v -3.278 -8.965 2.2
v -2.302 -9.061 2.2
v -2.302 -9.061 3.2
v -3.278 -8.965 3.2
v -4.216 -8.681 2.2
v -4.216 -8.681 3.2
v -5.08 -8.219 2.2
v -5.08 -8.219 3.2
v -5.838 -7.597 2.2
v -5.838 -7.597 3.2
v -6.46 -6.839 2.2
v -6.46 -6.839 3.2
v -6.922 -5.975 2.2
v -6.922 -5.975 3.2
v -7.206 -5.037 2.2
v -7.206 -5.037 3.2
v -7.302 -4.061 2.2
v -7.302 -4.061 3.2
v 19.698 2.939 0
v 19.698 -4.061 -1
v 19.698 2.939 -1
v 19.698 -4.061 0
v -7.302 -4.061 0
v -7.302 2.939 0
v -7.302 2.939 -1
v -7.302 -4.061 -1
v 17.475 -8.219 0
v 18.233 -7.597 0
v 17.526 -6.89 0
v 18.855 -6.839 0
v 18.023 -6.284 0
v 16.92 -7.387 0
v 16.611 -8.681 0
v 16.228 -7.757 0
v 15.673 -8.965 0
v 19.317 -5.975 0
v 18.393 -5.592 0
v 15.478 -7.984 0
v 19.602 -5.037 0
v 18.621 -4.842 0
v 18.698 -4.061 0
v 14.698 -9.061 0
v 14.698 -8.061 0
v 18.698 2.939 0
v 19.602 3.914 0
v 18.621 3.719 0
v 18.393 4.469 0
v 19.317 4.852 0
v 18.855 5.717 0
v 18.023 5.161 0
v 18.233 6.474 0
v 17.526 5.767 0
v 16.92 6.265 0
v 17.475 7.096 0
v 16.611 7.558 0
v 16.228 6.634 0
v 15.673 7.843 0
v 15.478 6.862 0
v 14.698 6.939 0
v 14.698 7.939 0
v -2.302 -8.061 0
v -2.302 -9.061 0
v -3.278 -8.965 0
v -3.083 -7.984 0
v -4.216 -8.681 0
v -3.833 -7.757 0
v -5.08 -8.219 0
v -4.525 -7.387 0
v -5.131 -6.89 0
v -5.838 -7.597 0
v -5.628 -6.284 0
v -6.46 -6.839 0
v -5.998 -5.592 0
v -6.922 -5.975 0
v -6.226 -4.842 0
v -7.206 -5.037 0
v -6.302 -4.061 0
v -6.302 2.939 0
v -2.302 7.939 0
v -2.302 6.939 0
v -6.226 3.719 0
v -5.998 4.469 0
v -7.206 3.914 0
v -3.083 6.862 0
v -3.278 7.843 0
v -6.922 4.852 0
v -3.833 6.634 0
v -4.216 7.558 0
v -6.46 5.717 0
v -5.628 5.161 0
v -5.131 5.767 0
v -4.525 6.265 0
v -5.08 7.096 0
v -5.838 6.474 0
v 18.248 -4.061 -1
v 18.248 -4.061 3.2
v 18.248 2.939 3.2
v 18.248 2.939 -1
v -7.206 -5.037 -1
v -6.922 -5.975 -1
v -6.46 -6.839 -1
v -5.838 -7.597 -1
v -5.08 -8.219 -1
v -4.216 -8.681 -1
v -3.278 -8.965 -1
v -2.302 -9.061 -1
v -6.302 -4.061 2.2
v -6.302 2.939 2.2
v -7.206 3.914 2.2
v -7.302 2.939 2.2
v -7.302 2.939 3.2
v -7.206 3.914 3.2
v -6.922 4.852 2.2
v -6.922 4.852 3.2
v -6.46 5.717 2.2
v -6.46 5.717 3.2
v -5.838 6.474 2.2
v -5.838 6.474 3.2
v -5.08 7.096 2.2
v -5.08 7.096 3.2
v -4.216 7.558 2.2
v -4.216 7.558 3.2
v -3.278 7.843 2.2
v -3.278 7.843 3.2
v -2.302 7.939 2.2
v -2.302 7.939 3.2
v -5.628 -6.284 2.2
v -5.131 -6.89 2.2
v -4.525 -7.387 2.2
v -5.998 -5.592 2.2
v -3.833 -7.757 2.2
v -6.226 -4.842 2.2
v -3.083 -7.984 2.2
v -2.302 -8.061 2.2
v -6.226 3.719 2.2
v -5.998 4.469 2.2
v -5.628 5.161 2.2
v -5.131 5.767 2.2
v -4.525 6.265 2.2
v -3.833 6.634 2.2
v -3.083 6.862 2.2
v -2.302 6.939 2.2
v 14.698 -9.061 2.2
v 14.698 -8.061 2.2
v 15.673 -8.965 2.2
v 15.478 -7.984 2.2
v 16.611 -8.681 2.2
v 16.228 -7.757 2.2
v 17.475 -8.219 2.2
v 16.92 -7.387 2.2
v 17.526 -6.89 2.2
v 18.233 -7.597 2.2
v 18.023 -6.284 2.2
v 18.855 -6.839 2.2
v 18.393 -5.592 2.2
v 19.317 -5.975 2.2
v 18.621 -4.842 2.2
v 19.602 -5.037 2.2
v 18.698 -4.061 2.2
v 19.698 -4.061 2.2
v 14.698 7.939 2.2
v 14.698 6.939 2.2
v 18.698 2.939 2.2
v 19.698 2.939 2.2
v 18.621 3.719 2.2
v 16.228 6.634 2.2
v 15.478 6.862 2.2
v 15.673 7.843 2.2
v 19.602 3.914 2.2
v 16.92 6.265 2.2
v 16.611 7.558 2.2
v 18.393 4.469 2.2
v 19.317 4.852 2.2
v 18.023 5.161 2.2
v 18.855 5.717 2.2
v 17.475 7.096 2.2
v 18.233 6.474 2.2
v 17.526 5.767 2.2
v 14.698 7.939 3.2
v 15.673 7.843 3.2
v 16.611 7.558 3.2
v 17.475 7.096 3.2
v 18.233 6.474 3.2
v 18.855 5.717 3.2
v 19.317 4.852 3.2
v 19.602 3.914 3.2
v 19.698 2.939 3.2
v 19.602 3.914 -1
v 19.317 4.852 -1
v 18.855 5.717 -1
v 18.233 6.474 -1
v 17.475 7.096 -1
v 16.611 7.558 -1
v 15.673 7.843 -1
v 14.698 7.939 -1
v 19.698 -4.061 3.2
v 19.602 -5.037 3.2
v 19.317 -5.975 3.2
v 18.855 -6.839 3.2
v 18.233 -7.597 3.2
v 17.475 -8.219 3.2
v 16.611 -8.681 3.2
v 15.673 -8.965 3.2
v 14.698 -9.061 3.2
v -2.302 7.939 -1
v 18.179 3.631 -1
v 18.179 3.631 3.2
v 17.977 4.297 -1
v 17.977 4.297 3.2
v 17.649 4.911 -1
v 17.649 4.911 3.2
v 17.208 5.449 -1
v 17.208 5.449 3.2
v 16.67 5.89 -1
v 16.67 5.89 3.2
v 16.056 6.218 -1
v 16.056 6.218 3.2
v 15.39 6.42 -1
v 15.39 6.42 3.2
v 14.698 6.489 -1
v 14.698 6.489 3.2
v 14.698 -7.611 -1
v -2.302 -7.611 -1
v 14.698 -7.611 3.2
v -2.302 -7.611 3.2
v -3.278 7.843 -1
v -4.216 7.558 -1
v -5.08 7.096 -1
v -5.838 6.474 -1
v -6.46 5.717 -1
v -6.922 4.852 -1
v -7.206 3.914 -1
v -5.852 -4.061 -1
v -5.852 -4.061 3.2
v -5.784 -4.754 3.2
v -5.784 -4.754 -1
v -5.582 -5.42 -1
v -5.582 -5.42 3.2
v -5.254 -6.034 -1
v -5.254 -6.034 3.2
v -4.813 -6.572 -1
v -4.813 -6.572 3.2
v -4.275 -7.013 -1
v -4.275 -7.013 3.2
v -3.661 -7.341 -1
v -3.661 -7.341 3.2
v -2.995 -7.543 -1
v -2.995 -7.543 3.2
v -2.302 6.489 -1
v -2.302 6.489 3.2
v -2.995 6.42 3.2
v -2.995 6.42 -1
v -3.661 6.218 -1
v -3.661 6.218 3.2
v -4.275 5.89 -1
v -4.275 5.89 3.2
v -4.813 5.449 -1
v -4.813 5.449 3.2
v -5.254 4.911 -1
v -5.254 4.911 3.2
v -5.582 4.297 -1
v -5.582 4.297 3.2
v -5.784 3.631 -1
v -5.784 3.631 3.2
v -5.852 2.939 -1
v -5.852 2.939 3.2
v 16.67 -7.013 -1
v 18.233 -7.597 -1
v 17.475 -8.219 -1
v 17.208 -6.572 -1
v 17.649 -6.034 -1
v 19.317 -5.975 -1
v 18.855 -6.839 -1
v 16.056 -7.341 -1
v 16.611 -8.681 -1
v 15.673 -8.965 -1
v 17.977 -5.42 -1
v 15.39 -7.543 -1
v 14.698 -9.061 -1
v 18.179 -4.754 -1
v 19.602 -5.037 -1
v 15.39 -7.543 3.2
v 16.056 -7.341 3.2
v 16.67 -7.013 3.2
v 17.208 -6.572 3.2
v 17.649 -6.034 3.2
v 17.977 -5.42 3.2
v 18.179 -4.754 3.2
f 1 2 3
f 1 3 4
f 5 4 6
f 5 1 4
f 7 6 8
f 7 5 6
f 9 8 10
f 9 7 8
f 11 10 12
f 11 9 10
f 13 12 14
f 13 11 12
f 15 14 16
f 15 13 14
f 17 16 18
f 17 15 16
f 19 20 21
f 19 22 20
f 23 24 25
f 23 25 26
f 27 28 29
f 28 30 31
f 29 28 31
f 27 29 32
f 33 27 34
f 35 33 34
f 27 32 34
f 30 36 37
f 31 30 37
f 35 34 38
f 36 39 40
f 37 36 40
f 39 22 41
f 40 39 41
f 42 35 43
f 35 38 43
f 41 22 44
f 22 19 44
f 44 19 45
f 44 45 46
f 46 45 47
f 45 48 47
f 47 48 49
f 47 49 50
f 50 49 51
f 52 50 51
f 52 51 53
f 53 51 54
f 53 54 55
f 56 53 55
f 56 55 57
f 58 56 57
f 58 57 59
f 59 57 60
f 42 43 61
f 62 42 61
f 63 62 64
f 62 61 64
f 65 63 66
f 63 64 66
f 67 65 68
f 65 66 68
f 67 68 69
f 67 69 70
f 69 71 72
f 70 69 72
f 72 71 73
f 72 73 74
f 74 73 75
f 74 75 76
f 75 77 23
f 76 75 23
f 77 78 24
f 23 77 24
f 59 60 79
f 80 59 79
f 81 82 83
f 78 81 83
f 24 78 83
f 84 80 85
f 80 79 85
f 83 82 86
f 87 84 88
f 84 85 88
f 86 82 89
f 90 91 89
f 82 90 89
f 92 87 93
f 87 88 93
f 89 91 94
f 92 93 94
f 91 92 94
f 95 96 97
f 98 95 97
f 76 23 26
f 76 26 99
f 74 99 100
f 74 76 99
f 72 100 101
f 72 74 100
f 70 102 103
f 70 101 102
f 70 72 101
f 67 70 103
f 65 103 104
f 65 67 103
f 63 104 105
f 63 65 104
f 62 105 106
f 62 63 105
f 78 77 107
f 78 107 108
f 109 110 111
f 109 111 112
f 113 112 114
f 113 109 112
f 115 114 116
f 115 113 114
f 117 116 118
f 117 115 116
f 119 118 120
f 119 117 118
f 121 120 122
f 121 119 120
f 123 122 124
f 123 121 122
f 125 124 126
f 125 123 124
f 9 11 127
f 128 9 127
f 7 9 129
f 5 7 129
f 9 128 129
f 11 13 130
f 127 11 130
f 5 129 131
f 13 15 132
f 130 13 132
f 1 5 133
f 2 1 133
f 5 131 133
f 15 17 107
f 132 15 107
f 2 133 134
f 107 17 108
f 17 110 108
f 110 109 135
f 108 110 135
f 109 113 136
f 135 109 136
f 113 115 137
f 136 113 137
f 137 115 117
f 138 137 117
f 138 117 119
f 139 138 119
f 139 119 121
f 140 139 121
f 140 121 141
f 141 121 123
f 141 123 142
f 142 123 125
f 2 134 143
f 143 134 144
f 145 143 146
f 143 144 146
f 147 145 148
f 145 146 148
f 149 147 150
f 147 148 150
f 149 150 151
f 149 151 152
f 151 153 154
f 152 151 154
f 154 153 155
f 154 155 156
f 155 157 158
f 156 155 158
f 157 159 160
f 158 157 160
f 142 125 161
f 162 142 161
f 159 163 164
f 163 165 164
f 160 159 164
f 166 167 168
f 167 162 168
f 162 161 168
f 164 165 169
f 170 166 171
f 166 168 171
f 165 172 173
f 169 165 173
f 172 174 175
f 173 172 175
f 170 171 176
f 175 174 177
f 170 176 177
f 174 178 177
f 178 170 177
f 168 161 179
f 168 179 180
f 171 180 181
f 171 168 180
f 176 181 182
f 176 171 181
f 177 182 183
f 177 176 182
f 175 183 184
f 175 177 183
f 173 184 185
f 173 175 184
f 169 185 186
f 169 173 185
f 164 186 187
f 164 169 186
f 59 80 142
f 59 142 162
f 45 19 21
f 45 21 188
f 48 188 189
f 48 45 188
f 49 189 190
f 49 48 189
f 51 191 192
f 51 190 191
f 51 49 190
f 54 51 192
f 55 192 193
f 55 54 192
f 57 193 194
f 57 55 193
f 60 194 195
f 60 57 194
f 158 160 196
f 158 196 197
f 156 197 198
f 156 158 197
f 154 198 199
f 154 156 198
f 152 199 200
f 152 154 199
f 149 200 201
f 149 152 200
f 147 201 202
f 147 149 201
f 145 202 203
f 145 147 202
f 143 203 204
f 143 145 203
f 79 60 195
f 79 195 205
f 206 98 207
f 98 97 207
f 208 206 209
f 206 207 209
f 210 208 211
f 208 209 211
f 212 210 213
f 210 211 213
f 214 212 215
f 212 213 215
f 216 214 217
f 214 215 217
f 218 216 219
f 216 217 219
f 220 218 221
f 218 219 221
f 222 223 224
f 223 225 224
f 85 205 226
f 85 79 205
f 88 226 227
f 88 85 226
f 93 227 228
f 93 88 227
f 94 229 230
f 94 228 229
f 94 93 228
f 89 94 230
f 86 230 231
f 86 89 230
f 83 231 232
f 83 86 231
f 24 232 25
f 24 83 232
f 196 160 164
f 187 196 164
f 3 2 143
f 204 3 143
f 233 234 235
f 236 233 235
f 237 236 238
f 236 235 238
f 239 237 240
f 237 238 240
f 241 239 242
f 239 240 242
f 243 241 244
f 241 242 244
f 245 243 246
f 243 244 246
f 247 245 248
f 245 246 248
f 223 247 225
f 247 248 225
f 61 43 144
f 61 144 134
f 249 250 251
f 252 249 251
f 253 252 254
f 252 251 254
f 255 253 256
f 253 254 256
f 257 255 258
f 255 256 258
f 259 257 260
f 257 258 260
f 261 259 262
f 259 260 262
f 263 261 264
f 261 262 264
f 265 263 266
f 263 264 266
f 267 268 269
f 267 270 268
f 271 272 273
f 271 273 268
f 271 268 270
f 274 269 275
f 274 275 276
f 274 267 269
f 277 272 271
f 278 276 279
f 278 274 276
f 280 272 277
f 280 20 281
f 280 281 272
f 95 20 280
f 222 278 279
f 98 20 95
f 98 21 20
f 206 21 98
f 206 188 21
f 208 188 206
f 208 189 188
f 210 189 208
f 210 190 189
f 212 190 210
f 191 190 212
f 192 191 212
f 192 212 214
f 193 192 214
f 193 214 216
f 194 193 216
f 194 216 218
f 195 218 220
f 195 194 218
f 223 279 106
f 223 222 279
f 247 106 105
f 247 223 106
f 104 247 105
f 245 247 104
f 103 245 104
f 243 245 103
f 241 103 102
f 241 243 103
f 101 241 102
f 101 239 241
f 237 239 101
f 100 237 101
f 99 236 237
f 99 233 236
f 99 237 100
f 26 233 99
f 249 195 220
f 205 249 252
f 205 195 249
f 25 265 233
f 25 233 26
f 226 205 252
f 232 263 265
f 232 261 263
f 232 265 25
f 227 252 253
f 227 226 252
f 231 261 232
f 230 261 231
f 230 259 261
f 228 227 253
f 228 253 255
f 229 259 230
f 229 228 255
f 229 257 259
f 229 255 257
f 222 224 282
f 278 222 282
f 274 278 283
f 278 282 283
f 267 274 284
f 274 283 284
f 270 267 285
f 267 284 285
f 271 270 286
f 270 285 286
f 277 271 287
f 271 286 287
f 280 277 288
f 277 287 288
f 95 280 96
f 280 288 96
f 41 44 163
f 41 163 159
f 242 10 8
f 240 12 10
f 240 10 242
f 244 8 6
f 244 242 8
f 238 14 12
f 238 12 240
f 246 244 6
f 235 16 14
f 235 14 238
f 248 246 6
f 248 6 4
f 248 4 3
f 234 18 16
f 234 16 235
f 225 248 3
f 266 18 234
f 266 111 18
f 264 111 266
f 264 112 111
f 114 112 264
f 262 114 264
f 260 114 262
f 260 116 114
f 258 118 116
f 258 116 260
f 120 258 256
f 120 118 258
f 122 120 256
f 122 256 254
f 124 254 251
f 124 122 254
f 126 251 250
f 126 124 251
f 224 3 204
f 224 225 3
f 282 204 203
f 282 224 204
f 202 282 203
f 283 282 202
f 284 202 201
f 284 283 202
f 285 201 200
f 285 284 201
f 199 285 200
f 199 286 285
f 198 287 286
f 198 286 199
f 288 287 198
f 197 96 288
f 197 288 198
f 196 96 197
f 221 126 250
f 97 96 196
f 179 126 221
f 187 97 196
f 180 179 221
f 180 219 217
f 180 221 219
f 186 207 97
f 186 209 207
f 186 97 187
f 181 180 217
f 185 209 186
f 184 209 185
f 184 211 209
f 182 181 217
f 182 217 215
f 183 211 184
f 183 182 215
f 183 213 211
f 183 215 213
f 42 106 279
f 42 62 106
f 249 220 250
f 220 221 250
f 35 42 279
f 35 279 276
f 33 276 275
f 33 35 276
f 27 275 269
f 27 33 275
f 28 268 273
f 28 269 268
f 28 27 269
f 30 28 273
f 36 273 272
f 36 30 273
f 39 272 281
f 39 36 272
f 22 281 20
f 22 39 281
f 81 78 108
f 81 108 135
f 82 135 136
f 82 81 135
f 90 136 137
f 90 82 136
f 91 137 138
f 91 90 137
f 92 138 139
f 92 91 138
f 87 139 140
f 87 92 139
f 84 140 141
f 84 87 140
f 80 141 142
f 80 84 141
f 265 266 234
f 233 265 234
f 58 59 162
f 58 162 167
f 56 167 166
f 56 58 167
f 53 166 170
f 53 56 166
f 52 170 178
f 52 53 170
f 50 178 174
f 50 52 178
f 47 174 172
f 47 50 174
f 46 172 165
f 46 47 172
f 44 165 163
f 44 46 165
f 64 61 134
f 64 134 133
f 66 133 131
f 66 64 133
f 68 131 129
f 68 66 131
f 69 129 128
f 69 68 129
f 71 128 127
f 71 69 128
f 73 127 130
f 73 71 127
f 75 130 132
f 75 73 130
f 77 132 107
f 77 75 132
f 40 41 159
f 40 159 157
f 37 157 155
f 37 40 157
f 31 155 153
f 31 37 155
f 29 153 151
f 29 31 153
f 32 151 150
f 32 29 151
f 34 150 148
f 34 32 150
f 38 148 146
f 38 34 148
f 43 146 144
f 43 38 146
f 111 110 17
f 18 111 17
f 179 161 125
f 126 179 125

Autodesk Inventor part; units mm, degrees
ref_plane "YZ Plane" through (0, 0, 0) normal (1, 0, 0) x (0, 1, 0)
ref_plane "XZ Plane" through (0, 0, 0) normal (0, 1, 0) x (-1, 0, 0)
ref_plane "XY Plane" through (0, 0, 0) normal (0, 0, 1) x (1, 0, 0)
sketch "Szkic1" plane through (0, 0, 0) normal (0, 0, 1) x (1, 0, 0)
  line L0 (-2.3024, 6.9387) -> (14.6976, 6.9387)
  line L1 (18.6976, 2.9387) -> (18.6976, -4.0613)
  line L2 (14.6976, -8.0613) -> (-2.3024, -8.0613)
  line L3 (-6.3024, -4.0613) -> (-6.3024, 2.9387)
  arc A0 (-2.3024, 6.9387) -> (-6.3024, 2.9387) centre (-2.3024, 2.9387) ccw
  arc A1 (18.6976, 2.9387) -> (14.6976, 6.9387) centre (14.6976, 2.9387) ccw
  arc A2 (14.6976, -8.0613) -> (18.6976, -4.0613) centre (14.6976, -4.0613) ccw
  arc A3 (-6.3024, -4.0613) -> (-2.3024, -8.0613) centre (-2.3024, -4.0613) ccw
  line L4 (14.6976, 6.4887) -> (-2.3024, 6.4887)
  arc A4 (-2.3024, 6.4887) -> (-5.8524, 2.9387) centre (-2.3024, 2.9387) ccw
  line L5 (-5.8524, 2.9387) -> (-5.8524, -4.0613)
  arc A5 (-5.8524, -4.0613) -> (-2.3024, -7.6113) centre (-2.3024, -4.0613) ccw
  line L6 (-2.3024, -7.6113) -> (14.6976, -7.6113)
  arc A6 (14.6976, -7.6113) -> (18.2476, -4.0613) centre (14.6976, -4.0613) ccw
  line L7 (18.2476, -4.0613) -> (18.2476, 2.9387)
  arc A7 (18.2476, 2.9387) -> (14.6976, 6.4887) centre (14.6976, 2.9387) ccw
  point P0 (0, 0)
  point P1 (18.6976, -8.0613)
  point P2 (18.6976, 6.9387)
  point P3 (-6.3024, -8.0613)
  dimension "d0" = 25
  dimension "d1" = 15
  dimension "d2" = 4
  dimension "d3" = 0.45
extrude "Wyciągnięcie proste1" add sketch "Szkic1" along normal blind 2.2
sketch "Szkic2" plane through (0, 0, 2.2) normal (0, 0, 1) x (1, 0, 0)
  arc A0 (18.2476, 2.9387) -> (14.6976, 6.4887) centre (14.6976, 2.9387) ccw projected
  line L0 (18.2476, 2.9387) -> (18.2476, -4.0613) projected
  arc A1 (14.6976, -7.6113) -> (18.2476, -4.0613) centre (14.6976, -4.0613) ccw projected
  line L1 (14.6976, -7.6113) -> (-2.3024, -7.6113) projected
  arc A2 (-5.8524, -4.0613) -> (-2.3024, -7.6113) centre (-2.3024, -4.0613) ccw projected
  line L2 (-5.8524, -4.0613) -> (-5.8524, 2.9387) projected
  arc A3 (-2.3024, 6.4887) -> (-5.8524, 2.9387) centre (-2.3024, 2.9387) ccw projected
  line L3 (-2.3024, 6.4887) -> (14.6976, 6.4887) projected
  line L4 (-6.3024, 2.9387) -> (-6.3024, -4.0613) projected
  arc A4 (-6.3024, -4.0613) -> (-2.3024, -8.0613) centre (-2.3024, -4.0613) ccw projected
  line L5 (-2.3024, -8.0613) -> (14.6976, -8.0613) projected
  arc A5 (14.6976, -8.0613) -> (18.6976, -4.0613) centre (14.6976, -4.0613) ccw projected
  line L6 (18.6976, -4.0613) -> (18.6976, 2.9387) projected
  arc A6 (18.6976, 2.9387) -> (14.6976, 6.9387) centre (14.6976, 2.9387) ccw projected
  line L7 (14.6976, 6.9387) -> (-2.3024, 6.9387) projected
  arc A7 (-2.3024, 6.9387) -> (-6.3024, 2.9387) centre (-2.3024, 2.9387) ccw projected
  line L8 (-7.3024, 2.9387) -> (-7.3024, -4.0613)
  arc A8 (-7.3024, -4.0613) -> (-2.3024, -9.0613) centre (-2.3024, -4.0613) ccw
  line L9 (-2.3024, -9.0613) -> (14.6976, -9.0613)
  arc A9 (14.6976, -9.0613) -> (19.6976, -4.0613) centre (14.6976, -4.0613) ccw
  line L10 (19.6976, -4.0613) -> (19.6976, 2.9387)
  arc A10 (19.6976, 2.9387) -> (14.6976, 7.9387) centre (14.6976, 2.9387) ccw
  line L11 (14.6976, 7.9387) -> (-2.3024, 7.9387)
  arc A11 (-2.3024, 7.9387) -> (-7.3024, 2.9387) centre (-2.3024, 2.9387) ccw
  point P0 (0, 0)
  dimension "d6" = 1
extrude "Wyciągnięcie proste2" add sketch "Szkic2" along normal blind 1 contours A7 L7 A6 L6 A5 L5 A4 L4 | A11 L11 A10 L10 A9 L9 A8 L8
sketch "Szkic3" plane through (0, 0, 0) normal (0, 0, -1) x (-1, 0, 0)
  line L0 (7.3024, 2.9387) -> (7.3024, -4.0613) projected
  arc A0 (7.3024, 2.9387) -> (2.3024, 7.9387) centre (2.3024, 2.9387) ccw projected
  line L1 (-14.6976, 7.9387) -> (2.3024, 7.9387) projected
  arc A1 (-14.6976, 7.9387) -> (-19.6976, 2.9387) centre (-14.6976, 2.9387) ccw projected
  line L2 (-19.6976, -4.0613) -> (-19.6976, 2.9387) projected
  arc A2 (-19.6976, -4.0613) -> (-14.6976, -9.0613) centre (-14.6976, -4.0613) ccw projected
  line L3 (2.3024, -9.0613) -> (-14.6976, -9.0613) projected
  arc A3 (2.3024, -9.0613) -> (7.3024, -4.0613) centre (2.3024, -4.0613) ccw projected
  arc A4 (6.3024, 2.9387) -> (2.3024, 6.9387) centre (2.3024, 2.9387) ccw projected
  line L4 (6.3024, 2.9387) -> (6.3024, -4.0613) projected
  arc A5 (2.3024, -8.0613) -> (6.3024, -4.0613) centre (2.3024, -4.0613) ccw projected
  line L5 (2.3024, -8.0613) -> (-14.6976, -8.0613) projected
  arc A6 (-18.6976, -4.0613) -> (-14.6976, -8.0613) centre (-14.6976, -4.0613) ccw projected
  line L6 (-18.6976, -4.0613) -> (-18.6976, 2.9387) projected
  arc A7 (-14.6976, 6.9387) -> (-18.6976, 2.9387) centre (-14.6976, 2.9387) ccw projected
  line L7 (-14.6976, 6.9387) -> (2.3024, 6.9387) projected
  arc A8 (-14.6976, 6.4887) -> (-18.2476, 2.9387) centre (-14.6976, 2.9387) ccw projected
  line L8 (-14.6976, 6.4887) -> (2.3024, 6.4887) projected
  arc A9 (5.8524, 2.9387) -> (2.3024, 6.4887) centre (2.3024, 2.9387) ccw projected
  line L9 (5.8524, 2.9387) -> (5.8524, -4.0613) projected
  arc A10 (2.3024, -7.6113) -> (5.8524, -4.0613) centre (2.3024, -4.0613) ccw projected
  line L10 (2.3024, -7.6113) -> (-14.6976, -7.6113) projected
  arc A11 (-18.2476, -4.0613) -> (-14.6976, -7.6113) centre (-14.6976, -4.0613) ccw projected
  line L11 (-18.2476, -4.0613) -> (-18.2476, 2.9387) projected
  line L12 (6.3024, 2.9387) -> (6.3024, -4.0613) projected
  arc A12 (6.3024, 2.9387) -> (2.3024, 6.9387) centre (2.3024, 2.9387) ccw projected
  line L13 (-14.6976, 6.9387) -> (2.3024, 6.9387) projected
  arc A13 (-14.6976, 6.9387) -> (-18.6976, 2.9387) centre (-14.6976, 2.9387) ccw projected
  line L14 (-18.6976, -4.0613) -> (-18.6976, 2.9387) projected
  arc A14 (-18.6976, -4.0613) -> (-14.6976, -8.0613) centre (-14.6976, -4.0613) ccw projected
  line L15 (2.3024, -8.0613) -> (-14.6976, -8.0613) projected
  arc A15 (2.3024, -8.0613) -> (6.3024, -4.0613) centre (2.3024, -4.0613) ccw projected
  point P0 (0, 0)
extrude "Wyciągnięcie proste3" add sketch "Szkic3" along normal blind 1 contours L0 A3 L3 A2 L2 A1 L1 A0 | L4 A5 L5 A6 L6 A7 L7 A4
properties part number "3DP_TPU_Cable_Feed_Through_25mm"
